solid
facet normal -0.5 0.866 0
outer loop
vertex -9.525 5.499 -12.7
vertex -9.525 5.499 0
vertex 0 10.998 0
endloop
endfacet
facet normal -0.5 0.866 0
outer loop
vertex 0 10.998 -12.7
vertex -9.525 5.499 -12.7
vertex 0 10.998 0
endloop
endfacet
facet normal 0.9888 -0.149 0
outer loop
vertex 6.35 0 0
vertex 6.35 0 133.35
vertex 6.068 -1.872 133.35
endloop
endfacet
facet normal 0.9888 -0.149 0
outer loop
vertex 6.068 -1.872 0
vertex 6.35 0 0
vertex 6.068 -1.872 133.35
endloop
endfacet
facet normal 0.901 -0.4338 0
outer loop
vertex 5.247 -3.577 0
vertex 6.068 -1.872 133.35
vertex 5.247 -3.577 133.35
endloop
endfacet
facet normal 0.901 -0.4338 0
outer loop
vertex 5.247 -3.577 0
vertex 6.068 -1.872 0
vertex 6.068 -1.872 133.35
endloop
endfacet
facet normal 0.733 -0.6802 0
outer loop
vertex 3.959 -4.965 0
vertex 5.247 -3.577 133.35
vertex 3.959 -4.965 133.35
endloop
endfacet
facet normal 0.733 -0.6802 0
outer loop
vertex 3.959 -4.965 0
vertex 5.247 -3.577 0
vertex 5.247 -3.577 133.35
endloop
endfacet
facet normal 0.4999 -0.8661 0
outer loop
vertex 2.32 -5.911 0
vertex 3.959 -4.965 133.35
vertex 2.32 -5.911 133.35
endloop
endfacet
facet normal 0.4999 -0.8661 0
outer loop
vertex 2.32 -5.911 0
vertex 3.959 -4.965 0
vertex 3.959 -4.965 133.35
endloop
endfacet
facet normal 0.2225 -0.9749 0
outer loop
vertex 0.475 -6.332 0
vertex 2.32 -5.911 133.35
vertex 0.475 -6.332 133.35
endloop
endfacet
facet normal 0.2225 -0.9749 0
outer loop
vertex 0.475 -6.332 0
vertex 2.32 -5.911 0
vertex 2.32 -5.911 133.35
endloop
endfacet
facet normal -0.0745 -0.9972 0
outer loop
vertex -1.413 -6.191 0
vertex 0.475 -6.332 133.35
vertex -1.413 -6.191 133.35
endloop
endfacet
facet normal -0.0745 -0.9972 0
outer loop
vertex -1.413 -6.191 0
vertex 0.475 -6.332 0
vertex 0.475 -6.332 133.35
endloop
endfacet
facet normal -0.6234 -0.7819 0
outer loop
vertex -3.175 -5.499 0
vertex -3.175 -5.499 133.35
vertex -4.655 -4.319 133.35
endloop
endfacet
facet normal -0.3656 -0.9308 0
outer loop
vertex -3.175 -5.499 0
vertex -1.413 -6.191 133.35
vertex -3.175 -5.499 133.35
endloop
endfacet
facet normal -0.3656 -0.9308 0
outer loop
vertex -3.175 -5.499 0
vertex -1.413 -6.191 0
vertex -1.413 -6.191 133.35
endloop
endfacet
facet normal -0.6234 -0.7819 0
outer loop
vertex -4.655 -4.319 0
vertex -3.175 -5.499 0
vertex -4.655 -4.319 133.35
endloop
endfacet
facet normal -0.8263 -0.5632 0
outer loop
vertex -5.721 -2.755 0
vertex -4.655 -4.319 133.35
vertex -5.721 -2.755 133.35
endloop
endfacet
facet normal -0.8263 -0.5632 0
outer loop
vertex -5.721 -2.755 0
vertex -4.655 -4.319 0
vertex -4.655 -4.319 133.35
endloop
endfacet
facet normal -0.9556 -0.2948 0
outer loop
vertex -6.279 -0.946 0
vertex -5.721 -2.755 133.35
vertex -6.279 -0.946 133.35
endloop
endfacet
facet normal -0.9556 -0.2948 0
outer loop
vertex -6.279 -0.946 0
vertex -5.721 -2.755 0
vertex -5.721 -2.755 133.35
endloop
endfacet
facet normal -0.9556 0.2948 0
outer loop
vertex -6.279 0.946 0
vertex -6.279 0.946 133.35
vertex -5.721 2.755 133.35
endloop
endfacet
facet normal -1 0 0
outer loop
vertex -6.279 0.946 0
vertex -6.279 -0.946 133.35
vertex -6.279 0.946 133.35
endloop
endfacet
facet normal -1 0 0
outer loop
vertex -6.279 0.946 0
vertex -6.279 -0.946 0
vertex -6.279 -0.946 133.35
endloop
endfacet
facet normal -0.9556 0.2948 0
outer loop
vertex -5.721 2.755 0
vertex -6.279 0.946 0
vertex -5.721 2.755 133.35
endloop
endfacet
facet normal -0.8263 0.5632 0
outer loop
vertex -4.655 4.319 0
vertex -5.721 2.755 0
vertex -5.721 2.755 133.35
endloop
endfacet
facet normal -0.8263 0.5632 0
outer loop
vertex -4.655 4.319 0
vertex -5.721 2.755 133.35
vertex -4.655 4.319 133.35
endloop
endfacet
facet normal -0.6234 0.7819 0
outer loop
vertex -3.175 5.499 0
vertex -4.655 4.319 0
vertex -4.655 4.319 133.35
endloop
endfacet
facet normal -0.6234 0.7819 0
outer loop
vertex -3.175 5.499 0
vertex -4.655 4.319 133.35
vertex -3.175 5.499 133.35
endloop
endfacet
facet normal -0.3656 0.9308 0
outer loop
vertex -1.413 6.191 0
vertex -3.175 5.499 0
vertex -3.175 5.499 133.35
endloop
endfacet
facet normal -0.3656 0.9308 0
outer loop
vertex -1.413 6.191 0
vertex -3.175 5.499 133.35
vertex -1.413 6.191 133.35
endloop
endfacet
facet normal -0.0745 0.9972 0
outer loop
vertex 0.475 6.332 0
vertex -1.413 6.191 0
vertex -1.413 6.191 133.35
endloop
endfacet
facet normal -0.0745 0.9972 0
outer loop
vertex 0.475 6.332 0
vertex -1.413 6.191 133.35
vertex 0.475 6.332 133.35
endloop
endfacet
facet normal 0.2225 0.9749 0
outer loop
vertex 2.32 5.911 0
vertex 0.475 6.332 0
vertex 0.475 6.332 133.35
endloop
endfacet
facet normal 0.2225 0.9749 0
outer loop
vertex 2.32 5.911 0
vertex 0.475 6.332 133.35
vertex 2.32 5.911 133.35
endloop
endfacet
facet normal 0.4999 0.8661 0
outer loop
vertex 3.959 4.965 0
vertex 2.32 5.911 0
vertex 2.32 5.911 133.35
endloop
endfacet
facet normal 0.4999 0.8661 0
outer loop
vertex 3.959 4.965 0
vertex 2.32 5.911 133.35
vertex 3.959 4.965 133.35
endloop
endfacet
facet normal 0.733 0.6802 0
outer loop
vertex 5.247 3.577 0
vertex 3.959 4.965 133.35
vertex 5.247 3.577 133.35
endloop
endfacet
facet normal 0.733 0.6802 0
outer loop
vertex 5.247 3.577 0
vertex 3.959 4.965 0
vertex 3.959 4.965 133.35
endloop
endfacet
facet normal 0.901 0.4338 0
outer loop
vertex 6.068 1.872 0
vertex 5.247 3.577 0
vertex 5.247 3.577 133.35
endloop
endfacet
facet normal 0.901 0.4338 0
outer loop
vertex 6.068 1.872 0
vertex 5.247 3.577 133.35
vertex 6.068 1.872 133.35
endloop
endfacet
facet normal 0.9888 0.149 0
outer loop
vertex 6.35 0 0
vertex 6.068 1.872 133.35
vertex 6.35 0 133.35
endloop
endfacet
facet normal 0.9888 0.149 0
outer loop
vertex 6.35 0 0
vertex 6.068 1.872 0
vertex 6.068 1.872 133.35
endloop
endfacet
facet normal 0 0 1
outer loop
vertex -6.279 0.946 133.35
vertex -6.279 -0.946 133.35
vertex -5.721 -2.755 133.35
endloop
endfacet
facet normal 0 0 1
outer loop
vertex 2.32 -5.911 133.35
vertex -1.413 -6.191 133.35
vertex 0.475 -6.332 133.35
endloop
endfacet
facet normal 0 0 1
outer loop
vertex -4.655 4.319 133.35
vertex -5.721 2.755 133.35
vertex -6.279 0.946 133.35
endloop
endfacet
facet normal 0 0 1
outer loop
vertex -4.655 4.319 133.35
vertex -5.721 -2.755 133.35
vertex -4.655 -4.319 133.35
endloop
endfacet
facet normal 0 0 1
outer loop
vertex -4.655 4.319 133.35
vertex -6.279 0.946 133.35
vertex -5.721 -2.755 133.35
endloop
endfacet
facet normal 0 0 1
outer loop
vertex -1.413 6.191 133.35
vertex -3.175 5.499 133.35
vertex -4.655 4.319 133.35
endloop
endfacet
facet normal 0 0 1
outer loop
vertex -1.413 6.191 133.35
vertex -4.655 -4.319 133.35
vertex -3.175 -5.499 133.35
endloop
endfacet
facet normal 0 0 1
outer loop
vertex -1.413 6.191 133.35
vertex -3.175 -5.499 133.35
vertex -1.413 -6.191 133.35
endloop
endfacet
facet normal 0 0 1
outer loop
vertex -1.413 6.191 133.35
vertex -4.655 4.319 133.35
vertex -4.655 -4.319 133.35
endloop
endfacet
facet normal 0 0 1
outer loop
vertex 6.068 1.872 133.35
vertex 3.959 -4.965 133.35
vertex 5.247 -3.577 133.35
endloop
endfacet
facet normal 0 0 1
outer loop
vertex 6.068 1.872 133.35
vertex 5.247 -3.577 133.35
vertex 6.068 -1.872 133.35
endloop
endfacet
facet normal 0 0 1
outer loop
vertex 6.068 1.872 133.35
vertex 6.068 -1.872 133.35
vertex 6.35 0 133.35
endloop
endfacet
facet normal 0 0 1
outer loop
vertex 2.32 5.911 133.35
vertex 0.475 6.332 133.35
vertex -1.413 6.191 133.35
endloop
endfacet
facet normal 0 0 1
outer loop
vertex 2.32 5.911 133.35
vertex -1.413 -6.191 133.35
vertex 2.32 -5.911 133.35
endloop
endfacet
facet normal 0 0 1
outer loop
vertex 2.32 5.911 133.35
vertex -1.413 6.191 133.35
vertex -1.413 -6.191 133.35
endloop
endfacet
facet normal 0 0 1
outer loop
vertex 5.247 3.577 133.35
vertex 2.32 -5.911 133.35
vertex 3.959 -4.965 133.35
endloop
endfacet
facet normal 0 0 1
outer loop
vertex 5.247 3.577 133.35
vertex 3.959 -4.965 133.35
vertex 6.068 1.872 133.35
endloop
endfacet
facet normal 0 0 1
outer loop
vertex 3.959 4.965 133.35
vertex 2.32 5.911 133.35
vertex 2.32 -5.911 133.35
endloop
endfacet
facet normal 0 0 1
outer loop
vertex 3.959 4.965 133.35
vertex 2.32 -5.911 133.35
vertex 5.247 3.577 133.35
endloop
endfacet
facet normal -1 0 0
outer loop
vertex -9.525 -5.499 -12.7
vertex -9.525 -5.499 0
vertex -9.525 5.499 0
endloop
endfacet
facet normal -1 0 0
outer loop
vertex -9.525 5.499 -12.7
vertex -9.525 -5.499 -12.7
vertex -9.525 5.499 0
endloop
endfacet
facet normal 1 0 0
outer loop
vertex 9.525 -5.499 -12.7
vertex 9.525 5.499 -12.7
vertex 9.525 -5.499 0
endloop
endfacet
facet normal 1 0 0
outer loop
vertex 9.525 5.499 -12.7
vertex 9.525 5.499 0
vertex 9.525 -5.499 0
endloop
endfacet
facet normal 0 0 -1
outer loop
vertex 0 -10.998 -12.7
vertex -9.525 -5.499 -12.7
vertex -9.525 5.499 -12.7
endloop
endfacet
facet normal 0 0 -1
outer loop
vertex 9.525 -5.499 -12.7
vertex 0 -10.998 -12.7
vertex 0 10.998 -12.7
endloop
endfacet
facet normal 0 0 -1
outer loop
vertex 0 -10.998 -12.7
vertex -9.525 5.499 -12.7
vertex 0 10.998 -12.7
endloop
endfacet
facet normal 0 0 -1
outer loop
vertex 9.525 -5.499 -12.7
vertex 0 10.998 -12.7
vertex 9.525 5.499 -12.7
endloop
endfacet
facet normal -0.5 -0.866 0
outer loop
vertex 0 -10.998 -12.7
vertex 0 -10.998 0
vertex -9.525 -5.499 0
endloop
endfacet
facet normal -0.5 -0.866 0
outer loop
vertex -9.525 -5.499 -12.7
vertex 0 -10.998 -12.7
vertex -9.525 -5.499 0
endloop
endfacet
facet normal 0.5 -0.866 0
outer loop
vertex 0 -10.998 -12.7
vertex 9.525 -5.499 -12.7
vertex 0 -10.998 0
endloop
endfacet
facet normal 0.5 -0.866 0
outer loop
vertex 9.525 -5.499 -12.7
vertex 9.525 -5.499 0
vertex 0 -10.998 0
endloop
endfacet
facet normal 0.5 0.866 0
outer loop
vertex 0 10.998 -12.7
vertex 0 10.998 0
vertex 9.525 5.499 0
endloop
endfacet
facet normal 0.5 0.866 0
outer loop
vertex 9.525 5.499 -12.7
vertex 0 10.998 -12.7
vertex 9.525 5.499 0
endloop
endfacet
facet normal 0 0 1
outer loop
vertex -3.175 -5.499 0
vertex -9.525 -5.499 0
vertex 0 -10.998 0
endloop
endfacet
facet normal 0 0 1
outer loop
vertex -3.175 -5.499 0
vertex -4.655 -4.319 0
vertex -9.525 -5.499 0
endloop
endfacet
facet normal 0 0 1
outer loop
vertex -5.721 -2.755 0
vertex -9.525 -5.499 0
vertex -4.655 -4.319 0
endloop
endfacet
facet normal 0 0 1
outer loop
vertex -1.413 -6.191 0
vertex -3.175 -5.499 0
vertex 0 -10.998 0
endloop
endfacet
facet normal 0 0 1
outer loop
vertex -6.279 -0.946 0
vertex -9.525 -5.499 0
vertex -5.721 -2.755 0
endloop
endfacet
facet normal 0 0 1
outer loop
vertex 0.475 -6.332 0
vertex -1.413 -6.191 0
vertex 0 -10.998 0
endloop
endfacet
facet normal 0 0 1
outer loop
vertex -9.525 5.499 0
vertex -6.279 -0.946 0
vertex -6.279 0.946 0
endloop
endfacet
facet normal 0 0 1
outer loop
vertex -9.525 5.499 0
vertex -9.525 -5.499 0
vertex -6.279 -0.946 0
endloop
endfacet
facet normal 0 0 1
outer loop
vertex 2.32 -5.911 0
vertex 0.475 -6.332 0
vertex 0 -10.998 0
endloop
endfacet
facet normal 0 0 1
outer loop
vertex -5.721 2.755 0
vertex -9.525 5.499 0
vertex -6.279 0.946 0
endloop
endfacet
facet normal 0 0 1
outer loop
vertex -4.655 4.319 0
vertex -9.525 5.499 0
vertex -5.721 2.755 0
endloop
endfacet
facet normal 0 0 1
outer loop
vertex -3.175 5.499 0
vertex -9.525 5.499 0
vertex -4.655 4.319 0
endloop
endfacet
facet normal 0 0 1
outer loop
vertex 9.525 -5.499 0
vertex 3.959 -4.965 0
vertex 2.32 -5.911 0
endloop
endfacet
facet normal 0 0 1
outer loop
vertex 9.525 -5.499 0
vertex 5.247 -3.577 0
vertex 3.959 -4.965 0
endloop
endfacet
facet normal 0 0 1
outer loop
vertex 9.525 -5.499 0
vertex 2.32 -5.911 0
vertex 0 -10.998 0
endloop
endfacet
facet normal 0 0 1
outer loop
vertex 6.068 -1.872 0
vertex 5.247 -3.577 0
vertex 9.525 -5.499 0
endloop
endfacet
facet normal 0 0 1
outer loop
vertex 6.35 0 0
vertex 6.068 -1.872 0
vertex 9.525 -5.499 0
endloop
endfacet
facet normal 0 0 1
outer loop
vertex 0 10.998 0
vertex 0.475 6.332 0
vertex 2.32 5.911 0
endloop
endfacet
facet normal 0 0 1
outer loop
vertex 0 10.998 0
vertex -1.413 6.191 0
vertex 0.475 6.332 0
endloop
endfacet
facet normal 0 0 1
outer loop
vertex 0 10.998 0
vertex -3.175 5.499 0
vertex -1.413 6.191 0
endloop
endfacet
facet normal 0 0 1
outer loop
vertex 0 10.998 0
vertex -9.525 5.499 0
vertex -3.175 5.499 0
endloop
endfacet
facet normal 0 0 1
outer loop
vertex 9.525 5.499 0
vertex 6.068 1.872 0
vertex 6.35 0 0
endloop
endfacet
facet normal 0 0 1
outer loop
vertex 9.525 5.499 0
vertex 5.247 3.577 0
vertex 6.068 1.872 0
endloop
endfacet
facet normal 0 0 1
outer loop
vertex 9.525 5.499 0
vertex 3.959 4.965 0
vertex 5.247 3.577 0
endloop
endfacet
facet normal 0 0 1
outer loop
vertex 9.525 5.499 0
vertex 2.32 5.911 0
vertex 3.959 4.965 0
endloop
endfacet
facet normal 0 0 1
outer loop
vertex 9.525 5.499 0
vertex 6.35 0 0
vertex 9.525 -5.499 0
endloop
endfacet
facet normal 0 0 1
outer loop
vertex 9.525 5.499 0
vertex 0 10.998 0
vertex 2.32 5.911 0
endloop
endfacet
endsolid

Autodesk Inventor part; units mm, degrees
ref_plane "YZ Plane" through (0, 0, 0) normal (1, 0, 0) x (0, 1, 0)
ref_plane "XZ Plane" through (0, 0, 0) normal (0, 1, 0) x (-1, 0, 0)
ref_plane "XY Plane" through (0, 0, 0) normal (0, 0, 1) x (1, 0, 0)
sketch "Sketch1" plane through (0, 0, 0) normal (0, 0, 1) x (1, 0, 0)
  circle A0 centre (0, 0) radius 6.35
  line L0 (0, 10.9985) -> (9.525, 5.4993)
  line L1 (9.525, 5.4993) -> (9.525, -5.4993)
  line L2 (9.525, -5.4993) -> (0, -10.9985)
  line L3 (0, -10.9985) -> (-9.525, -5.4993)
  line L4 (-9.525, -5.4993) -> (-9.525, 5.4993)
  line L5 (-9.525, 5.4993) -> (0, 10.9985)
  dimension "d1" = 19.05
extrude "Extrusion1" add sketch "Sketch1" against normal blind 12.7 contours A0 | L0 L1 L2 L3 L4 L5
sketch "Sketch2" plane through (0, 0, 0) normal (0, 0, 1) x (1, 0, 0)
  circle A0 centre (0, 0) radius 6.35
  dimension "d4" = 12.7
extrude "Extrusion2" add sketch "Sketch2" along normal blind 133.35
thread "Thread1" size "1/2-13 UNC" class "2A" standard "ANSI Unified Screw Threads" full length
properties part number "5.25 in bolt"
